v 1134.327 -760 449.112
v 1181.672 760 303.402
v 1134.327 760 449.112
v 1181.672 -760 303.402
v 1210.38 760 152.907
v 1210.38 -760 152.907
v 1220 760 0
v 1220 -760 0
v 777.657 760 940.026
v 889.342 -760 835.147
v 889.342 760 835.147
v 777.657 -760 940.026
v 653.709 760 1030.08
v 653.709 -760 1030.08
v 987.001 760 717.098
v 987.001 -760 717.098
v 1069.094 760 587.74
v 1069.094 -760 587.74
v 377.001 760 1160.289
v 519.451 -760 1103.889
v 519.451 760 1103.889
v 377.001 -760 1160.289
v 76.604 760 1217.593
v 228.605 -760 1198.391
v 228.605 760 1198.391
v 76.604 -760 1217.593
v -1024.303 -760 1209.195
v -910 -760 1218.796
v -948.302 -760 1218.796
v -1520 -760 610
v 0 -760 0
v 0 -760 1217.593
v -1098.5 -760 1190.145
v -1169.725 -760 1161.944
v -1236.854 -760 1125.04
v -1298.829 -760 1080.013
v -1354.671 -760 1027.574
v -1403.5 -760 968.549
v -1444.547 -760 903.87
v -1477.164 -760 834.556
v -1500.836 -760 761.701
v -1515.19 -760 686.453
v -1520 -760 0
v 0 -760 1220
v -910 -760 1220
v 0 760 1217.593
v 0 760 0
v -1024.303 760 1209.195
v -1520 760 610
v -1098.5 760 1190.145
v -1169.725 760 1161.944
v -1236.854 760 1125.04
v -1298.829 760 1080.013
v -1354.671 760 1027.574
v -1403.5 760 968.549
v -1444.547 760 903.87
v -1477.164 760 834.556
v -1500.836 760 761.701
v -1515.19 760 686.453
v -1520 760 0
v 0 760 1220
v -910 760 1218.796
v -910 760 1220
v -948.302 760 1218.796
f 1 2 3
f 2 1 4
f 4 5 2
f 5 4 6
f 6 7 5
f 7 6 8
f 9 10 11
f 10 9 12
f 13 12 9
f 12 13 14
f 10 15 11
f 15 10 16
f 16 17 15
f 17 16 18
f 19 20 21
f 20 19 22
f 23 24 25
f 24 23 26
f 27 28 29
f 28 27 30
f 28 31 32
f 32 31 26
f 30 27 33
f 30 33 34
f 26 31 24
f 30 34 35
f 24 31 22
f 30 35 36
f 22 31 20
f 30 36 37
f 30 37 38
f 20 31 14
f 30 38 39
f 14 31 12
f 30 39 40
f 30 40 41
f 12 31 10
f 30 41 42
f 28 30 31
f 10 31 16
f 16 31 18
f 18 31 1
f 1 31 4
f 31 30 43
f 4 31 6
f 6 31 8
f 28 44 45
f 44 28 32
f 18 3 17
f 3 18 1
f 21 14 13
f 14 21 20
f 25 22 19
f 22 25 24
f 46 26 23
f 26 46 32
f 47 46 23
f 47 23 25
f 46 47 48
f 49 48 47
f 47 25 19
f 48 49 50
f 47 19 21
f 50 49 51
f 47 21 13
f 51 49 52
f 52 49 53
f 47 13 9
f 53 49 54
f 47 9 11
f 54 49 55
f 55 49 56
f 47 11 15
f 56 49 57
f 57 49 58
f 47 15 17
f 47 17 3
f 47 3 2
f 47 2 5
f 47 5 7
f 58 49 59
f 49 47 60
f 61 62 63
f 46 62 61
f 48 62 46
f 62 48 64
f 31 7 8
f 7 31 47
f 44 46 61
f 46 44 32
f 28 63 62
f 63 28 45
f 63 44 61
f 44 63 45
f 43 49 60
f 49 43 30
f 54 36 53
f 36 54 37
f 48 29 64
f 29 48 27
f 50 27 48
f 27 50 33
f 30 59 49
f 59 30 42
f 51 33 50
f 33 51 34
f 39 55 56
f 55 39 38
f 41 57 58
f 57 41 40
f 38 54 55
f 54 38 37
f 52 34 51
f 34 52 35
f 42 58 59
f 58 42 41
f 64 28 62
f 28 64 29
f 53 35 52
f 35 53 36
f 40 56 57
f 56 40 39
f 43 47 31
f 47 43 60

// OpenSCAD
cabin_height = 1220; // millimeters
cabin_width = 1520; // millimeters
cabin_length = 2740;

$fn = 50; // fragment number

union() {
  difference() {
    // Starting cylinder
    rotate([90, 0, 0])
      cylinder(cabin_width, r = cabin_height, center = true);

    // left half remove
    translate([0, 0, -cabin_height + (cabin_height / 2)])
      cube([cabin_height * 2, cabin_width, cabin_height], center = true);

    // bottom half remove
    translate([-cabin_height + (cabin_height / 2), 0, 0])
      cube([cabin_height, cabin_width, cabin_height * 2], center = true);
  }

  difference() {
    cabin_block_size = cabin_length - cabin_height;

    translate([-cabin_block_size, -(cabin_width / 2), 0])
      cube([cabin_block_size, cabin_width, cabin_height]);

    translate([-(cabin_block_size - (cabin_height / 2)), 0, cabin_height / 2])
    difference() {
      translate([-(cabin_height / 2), -(cabin_width / 2), 0])
        cube([cabin_height / 2, cabin_width, cabin_height / 2]);

      rotate([90, 0, 0])
        cylinder(cabin_width, d = cabin_height, center = true);
    }
  }
}
